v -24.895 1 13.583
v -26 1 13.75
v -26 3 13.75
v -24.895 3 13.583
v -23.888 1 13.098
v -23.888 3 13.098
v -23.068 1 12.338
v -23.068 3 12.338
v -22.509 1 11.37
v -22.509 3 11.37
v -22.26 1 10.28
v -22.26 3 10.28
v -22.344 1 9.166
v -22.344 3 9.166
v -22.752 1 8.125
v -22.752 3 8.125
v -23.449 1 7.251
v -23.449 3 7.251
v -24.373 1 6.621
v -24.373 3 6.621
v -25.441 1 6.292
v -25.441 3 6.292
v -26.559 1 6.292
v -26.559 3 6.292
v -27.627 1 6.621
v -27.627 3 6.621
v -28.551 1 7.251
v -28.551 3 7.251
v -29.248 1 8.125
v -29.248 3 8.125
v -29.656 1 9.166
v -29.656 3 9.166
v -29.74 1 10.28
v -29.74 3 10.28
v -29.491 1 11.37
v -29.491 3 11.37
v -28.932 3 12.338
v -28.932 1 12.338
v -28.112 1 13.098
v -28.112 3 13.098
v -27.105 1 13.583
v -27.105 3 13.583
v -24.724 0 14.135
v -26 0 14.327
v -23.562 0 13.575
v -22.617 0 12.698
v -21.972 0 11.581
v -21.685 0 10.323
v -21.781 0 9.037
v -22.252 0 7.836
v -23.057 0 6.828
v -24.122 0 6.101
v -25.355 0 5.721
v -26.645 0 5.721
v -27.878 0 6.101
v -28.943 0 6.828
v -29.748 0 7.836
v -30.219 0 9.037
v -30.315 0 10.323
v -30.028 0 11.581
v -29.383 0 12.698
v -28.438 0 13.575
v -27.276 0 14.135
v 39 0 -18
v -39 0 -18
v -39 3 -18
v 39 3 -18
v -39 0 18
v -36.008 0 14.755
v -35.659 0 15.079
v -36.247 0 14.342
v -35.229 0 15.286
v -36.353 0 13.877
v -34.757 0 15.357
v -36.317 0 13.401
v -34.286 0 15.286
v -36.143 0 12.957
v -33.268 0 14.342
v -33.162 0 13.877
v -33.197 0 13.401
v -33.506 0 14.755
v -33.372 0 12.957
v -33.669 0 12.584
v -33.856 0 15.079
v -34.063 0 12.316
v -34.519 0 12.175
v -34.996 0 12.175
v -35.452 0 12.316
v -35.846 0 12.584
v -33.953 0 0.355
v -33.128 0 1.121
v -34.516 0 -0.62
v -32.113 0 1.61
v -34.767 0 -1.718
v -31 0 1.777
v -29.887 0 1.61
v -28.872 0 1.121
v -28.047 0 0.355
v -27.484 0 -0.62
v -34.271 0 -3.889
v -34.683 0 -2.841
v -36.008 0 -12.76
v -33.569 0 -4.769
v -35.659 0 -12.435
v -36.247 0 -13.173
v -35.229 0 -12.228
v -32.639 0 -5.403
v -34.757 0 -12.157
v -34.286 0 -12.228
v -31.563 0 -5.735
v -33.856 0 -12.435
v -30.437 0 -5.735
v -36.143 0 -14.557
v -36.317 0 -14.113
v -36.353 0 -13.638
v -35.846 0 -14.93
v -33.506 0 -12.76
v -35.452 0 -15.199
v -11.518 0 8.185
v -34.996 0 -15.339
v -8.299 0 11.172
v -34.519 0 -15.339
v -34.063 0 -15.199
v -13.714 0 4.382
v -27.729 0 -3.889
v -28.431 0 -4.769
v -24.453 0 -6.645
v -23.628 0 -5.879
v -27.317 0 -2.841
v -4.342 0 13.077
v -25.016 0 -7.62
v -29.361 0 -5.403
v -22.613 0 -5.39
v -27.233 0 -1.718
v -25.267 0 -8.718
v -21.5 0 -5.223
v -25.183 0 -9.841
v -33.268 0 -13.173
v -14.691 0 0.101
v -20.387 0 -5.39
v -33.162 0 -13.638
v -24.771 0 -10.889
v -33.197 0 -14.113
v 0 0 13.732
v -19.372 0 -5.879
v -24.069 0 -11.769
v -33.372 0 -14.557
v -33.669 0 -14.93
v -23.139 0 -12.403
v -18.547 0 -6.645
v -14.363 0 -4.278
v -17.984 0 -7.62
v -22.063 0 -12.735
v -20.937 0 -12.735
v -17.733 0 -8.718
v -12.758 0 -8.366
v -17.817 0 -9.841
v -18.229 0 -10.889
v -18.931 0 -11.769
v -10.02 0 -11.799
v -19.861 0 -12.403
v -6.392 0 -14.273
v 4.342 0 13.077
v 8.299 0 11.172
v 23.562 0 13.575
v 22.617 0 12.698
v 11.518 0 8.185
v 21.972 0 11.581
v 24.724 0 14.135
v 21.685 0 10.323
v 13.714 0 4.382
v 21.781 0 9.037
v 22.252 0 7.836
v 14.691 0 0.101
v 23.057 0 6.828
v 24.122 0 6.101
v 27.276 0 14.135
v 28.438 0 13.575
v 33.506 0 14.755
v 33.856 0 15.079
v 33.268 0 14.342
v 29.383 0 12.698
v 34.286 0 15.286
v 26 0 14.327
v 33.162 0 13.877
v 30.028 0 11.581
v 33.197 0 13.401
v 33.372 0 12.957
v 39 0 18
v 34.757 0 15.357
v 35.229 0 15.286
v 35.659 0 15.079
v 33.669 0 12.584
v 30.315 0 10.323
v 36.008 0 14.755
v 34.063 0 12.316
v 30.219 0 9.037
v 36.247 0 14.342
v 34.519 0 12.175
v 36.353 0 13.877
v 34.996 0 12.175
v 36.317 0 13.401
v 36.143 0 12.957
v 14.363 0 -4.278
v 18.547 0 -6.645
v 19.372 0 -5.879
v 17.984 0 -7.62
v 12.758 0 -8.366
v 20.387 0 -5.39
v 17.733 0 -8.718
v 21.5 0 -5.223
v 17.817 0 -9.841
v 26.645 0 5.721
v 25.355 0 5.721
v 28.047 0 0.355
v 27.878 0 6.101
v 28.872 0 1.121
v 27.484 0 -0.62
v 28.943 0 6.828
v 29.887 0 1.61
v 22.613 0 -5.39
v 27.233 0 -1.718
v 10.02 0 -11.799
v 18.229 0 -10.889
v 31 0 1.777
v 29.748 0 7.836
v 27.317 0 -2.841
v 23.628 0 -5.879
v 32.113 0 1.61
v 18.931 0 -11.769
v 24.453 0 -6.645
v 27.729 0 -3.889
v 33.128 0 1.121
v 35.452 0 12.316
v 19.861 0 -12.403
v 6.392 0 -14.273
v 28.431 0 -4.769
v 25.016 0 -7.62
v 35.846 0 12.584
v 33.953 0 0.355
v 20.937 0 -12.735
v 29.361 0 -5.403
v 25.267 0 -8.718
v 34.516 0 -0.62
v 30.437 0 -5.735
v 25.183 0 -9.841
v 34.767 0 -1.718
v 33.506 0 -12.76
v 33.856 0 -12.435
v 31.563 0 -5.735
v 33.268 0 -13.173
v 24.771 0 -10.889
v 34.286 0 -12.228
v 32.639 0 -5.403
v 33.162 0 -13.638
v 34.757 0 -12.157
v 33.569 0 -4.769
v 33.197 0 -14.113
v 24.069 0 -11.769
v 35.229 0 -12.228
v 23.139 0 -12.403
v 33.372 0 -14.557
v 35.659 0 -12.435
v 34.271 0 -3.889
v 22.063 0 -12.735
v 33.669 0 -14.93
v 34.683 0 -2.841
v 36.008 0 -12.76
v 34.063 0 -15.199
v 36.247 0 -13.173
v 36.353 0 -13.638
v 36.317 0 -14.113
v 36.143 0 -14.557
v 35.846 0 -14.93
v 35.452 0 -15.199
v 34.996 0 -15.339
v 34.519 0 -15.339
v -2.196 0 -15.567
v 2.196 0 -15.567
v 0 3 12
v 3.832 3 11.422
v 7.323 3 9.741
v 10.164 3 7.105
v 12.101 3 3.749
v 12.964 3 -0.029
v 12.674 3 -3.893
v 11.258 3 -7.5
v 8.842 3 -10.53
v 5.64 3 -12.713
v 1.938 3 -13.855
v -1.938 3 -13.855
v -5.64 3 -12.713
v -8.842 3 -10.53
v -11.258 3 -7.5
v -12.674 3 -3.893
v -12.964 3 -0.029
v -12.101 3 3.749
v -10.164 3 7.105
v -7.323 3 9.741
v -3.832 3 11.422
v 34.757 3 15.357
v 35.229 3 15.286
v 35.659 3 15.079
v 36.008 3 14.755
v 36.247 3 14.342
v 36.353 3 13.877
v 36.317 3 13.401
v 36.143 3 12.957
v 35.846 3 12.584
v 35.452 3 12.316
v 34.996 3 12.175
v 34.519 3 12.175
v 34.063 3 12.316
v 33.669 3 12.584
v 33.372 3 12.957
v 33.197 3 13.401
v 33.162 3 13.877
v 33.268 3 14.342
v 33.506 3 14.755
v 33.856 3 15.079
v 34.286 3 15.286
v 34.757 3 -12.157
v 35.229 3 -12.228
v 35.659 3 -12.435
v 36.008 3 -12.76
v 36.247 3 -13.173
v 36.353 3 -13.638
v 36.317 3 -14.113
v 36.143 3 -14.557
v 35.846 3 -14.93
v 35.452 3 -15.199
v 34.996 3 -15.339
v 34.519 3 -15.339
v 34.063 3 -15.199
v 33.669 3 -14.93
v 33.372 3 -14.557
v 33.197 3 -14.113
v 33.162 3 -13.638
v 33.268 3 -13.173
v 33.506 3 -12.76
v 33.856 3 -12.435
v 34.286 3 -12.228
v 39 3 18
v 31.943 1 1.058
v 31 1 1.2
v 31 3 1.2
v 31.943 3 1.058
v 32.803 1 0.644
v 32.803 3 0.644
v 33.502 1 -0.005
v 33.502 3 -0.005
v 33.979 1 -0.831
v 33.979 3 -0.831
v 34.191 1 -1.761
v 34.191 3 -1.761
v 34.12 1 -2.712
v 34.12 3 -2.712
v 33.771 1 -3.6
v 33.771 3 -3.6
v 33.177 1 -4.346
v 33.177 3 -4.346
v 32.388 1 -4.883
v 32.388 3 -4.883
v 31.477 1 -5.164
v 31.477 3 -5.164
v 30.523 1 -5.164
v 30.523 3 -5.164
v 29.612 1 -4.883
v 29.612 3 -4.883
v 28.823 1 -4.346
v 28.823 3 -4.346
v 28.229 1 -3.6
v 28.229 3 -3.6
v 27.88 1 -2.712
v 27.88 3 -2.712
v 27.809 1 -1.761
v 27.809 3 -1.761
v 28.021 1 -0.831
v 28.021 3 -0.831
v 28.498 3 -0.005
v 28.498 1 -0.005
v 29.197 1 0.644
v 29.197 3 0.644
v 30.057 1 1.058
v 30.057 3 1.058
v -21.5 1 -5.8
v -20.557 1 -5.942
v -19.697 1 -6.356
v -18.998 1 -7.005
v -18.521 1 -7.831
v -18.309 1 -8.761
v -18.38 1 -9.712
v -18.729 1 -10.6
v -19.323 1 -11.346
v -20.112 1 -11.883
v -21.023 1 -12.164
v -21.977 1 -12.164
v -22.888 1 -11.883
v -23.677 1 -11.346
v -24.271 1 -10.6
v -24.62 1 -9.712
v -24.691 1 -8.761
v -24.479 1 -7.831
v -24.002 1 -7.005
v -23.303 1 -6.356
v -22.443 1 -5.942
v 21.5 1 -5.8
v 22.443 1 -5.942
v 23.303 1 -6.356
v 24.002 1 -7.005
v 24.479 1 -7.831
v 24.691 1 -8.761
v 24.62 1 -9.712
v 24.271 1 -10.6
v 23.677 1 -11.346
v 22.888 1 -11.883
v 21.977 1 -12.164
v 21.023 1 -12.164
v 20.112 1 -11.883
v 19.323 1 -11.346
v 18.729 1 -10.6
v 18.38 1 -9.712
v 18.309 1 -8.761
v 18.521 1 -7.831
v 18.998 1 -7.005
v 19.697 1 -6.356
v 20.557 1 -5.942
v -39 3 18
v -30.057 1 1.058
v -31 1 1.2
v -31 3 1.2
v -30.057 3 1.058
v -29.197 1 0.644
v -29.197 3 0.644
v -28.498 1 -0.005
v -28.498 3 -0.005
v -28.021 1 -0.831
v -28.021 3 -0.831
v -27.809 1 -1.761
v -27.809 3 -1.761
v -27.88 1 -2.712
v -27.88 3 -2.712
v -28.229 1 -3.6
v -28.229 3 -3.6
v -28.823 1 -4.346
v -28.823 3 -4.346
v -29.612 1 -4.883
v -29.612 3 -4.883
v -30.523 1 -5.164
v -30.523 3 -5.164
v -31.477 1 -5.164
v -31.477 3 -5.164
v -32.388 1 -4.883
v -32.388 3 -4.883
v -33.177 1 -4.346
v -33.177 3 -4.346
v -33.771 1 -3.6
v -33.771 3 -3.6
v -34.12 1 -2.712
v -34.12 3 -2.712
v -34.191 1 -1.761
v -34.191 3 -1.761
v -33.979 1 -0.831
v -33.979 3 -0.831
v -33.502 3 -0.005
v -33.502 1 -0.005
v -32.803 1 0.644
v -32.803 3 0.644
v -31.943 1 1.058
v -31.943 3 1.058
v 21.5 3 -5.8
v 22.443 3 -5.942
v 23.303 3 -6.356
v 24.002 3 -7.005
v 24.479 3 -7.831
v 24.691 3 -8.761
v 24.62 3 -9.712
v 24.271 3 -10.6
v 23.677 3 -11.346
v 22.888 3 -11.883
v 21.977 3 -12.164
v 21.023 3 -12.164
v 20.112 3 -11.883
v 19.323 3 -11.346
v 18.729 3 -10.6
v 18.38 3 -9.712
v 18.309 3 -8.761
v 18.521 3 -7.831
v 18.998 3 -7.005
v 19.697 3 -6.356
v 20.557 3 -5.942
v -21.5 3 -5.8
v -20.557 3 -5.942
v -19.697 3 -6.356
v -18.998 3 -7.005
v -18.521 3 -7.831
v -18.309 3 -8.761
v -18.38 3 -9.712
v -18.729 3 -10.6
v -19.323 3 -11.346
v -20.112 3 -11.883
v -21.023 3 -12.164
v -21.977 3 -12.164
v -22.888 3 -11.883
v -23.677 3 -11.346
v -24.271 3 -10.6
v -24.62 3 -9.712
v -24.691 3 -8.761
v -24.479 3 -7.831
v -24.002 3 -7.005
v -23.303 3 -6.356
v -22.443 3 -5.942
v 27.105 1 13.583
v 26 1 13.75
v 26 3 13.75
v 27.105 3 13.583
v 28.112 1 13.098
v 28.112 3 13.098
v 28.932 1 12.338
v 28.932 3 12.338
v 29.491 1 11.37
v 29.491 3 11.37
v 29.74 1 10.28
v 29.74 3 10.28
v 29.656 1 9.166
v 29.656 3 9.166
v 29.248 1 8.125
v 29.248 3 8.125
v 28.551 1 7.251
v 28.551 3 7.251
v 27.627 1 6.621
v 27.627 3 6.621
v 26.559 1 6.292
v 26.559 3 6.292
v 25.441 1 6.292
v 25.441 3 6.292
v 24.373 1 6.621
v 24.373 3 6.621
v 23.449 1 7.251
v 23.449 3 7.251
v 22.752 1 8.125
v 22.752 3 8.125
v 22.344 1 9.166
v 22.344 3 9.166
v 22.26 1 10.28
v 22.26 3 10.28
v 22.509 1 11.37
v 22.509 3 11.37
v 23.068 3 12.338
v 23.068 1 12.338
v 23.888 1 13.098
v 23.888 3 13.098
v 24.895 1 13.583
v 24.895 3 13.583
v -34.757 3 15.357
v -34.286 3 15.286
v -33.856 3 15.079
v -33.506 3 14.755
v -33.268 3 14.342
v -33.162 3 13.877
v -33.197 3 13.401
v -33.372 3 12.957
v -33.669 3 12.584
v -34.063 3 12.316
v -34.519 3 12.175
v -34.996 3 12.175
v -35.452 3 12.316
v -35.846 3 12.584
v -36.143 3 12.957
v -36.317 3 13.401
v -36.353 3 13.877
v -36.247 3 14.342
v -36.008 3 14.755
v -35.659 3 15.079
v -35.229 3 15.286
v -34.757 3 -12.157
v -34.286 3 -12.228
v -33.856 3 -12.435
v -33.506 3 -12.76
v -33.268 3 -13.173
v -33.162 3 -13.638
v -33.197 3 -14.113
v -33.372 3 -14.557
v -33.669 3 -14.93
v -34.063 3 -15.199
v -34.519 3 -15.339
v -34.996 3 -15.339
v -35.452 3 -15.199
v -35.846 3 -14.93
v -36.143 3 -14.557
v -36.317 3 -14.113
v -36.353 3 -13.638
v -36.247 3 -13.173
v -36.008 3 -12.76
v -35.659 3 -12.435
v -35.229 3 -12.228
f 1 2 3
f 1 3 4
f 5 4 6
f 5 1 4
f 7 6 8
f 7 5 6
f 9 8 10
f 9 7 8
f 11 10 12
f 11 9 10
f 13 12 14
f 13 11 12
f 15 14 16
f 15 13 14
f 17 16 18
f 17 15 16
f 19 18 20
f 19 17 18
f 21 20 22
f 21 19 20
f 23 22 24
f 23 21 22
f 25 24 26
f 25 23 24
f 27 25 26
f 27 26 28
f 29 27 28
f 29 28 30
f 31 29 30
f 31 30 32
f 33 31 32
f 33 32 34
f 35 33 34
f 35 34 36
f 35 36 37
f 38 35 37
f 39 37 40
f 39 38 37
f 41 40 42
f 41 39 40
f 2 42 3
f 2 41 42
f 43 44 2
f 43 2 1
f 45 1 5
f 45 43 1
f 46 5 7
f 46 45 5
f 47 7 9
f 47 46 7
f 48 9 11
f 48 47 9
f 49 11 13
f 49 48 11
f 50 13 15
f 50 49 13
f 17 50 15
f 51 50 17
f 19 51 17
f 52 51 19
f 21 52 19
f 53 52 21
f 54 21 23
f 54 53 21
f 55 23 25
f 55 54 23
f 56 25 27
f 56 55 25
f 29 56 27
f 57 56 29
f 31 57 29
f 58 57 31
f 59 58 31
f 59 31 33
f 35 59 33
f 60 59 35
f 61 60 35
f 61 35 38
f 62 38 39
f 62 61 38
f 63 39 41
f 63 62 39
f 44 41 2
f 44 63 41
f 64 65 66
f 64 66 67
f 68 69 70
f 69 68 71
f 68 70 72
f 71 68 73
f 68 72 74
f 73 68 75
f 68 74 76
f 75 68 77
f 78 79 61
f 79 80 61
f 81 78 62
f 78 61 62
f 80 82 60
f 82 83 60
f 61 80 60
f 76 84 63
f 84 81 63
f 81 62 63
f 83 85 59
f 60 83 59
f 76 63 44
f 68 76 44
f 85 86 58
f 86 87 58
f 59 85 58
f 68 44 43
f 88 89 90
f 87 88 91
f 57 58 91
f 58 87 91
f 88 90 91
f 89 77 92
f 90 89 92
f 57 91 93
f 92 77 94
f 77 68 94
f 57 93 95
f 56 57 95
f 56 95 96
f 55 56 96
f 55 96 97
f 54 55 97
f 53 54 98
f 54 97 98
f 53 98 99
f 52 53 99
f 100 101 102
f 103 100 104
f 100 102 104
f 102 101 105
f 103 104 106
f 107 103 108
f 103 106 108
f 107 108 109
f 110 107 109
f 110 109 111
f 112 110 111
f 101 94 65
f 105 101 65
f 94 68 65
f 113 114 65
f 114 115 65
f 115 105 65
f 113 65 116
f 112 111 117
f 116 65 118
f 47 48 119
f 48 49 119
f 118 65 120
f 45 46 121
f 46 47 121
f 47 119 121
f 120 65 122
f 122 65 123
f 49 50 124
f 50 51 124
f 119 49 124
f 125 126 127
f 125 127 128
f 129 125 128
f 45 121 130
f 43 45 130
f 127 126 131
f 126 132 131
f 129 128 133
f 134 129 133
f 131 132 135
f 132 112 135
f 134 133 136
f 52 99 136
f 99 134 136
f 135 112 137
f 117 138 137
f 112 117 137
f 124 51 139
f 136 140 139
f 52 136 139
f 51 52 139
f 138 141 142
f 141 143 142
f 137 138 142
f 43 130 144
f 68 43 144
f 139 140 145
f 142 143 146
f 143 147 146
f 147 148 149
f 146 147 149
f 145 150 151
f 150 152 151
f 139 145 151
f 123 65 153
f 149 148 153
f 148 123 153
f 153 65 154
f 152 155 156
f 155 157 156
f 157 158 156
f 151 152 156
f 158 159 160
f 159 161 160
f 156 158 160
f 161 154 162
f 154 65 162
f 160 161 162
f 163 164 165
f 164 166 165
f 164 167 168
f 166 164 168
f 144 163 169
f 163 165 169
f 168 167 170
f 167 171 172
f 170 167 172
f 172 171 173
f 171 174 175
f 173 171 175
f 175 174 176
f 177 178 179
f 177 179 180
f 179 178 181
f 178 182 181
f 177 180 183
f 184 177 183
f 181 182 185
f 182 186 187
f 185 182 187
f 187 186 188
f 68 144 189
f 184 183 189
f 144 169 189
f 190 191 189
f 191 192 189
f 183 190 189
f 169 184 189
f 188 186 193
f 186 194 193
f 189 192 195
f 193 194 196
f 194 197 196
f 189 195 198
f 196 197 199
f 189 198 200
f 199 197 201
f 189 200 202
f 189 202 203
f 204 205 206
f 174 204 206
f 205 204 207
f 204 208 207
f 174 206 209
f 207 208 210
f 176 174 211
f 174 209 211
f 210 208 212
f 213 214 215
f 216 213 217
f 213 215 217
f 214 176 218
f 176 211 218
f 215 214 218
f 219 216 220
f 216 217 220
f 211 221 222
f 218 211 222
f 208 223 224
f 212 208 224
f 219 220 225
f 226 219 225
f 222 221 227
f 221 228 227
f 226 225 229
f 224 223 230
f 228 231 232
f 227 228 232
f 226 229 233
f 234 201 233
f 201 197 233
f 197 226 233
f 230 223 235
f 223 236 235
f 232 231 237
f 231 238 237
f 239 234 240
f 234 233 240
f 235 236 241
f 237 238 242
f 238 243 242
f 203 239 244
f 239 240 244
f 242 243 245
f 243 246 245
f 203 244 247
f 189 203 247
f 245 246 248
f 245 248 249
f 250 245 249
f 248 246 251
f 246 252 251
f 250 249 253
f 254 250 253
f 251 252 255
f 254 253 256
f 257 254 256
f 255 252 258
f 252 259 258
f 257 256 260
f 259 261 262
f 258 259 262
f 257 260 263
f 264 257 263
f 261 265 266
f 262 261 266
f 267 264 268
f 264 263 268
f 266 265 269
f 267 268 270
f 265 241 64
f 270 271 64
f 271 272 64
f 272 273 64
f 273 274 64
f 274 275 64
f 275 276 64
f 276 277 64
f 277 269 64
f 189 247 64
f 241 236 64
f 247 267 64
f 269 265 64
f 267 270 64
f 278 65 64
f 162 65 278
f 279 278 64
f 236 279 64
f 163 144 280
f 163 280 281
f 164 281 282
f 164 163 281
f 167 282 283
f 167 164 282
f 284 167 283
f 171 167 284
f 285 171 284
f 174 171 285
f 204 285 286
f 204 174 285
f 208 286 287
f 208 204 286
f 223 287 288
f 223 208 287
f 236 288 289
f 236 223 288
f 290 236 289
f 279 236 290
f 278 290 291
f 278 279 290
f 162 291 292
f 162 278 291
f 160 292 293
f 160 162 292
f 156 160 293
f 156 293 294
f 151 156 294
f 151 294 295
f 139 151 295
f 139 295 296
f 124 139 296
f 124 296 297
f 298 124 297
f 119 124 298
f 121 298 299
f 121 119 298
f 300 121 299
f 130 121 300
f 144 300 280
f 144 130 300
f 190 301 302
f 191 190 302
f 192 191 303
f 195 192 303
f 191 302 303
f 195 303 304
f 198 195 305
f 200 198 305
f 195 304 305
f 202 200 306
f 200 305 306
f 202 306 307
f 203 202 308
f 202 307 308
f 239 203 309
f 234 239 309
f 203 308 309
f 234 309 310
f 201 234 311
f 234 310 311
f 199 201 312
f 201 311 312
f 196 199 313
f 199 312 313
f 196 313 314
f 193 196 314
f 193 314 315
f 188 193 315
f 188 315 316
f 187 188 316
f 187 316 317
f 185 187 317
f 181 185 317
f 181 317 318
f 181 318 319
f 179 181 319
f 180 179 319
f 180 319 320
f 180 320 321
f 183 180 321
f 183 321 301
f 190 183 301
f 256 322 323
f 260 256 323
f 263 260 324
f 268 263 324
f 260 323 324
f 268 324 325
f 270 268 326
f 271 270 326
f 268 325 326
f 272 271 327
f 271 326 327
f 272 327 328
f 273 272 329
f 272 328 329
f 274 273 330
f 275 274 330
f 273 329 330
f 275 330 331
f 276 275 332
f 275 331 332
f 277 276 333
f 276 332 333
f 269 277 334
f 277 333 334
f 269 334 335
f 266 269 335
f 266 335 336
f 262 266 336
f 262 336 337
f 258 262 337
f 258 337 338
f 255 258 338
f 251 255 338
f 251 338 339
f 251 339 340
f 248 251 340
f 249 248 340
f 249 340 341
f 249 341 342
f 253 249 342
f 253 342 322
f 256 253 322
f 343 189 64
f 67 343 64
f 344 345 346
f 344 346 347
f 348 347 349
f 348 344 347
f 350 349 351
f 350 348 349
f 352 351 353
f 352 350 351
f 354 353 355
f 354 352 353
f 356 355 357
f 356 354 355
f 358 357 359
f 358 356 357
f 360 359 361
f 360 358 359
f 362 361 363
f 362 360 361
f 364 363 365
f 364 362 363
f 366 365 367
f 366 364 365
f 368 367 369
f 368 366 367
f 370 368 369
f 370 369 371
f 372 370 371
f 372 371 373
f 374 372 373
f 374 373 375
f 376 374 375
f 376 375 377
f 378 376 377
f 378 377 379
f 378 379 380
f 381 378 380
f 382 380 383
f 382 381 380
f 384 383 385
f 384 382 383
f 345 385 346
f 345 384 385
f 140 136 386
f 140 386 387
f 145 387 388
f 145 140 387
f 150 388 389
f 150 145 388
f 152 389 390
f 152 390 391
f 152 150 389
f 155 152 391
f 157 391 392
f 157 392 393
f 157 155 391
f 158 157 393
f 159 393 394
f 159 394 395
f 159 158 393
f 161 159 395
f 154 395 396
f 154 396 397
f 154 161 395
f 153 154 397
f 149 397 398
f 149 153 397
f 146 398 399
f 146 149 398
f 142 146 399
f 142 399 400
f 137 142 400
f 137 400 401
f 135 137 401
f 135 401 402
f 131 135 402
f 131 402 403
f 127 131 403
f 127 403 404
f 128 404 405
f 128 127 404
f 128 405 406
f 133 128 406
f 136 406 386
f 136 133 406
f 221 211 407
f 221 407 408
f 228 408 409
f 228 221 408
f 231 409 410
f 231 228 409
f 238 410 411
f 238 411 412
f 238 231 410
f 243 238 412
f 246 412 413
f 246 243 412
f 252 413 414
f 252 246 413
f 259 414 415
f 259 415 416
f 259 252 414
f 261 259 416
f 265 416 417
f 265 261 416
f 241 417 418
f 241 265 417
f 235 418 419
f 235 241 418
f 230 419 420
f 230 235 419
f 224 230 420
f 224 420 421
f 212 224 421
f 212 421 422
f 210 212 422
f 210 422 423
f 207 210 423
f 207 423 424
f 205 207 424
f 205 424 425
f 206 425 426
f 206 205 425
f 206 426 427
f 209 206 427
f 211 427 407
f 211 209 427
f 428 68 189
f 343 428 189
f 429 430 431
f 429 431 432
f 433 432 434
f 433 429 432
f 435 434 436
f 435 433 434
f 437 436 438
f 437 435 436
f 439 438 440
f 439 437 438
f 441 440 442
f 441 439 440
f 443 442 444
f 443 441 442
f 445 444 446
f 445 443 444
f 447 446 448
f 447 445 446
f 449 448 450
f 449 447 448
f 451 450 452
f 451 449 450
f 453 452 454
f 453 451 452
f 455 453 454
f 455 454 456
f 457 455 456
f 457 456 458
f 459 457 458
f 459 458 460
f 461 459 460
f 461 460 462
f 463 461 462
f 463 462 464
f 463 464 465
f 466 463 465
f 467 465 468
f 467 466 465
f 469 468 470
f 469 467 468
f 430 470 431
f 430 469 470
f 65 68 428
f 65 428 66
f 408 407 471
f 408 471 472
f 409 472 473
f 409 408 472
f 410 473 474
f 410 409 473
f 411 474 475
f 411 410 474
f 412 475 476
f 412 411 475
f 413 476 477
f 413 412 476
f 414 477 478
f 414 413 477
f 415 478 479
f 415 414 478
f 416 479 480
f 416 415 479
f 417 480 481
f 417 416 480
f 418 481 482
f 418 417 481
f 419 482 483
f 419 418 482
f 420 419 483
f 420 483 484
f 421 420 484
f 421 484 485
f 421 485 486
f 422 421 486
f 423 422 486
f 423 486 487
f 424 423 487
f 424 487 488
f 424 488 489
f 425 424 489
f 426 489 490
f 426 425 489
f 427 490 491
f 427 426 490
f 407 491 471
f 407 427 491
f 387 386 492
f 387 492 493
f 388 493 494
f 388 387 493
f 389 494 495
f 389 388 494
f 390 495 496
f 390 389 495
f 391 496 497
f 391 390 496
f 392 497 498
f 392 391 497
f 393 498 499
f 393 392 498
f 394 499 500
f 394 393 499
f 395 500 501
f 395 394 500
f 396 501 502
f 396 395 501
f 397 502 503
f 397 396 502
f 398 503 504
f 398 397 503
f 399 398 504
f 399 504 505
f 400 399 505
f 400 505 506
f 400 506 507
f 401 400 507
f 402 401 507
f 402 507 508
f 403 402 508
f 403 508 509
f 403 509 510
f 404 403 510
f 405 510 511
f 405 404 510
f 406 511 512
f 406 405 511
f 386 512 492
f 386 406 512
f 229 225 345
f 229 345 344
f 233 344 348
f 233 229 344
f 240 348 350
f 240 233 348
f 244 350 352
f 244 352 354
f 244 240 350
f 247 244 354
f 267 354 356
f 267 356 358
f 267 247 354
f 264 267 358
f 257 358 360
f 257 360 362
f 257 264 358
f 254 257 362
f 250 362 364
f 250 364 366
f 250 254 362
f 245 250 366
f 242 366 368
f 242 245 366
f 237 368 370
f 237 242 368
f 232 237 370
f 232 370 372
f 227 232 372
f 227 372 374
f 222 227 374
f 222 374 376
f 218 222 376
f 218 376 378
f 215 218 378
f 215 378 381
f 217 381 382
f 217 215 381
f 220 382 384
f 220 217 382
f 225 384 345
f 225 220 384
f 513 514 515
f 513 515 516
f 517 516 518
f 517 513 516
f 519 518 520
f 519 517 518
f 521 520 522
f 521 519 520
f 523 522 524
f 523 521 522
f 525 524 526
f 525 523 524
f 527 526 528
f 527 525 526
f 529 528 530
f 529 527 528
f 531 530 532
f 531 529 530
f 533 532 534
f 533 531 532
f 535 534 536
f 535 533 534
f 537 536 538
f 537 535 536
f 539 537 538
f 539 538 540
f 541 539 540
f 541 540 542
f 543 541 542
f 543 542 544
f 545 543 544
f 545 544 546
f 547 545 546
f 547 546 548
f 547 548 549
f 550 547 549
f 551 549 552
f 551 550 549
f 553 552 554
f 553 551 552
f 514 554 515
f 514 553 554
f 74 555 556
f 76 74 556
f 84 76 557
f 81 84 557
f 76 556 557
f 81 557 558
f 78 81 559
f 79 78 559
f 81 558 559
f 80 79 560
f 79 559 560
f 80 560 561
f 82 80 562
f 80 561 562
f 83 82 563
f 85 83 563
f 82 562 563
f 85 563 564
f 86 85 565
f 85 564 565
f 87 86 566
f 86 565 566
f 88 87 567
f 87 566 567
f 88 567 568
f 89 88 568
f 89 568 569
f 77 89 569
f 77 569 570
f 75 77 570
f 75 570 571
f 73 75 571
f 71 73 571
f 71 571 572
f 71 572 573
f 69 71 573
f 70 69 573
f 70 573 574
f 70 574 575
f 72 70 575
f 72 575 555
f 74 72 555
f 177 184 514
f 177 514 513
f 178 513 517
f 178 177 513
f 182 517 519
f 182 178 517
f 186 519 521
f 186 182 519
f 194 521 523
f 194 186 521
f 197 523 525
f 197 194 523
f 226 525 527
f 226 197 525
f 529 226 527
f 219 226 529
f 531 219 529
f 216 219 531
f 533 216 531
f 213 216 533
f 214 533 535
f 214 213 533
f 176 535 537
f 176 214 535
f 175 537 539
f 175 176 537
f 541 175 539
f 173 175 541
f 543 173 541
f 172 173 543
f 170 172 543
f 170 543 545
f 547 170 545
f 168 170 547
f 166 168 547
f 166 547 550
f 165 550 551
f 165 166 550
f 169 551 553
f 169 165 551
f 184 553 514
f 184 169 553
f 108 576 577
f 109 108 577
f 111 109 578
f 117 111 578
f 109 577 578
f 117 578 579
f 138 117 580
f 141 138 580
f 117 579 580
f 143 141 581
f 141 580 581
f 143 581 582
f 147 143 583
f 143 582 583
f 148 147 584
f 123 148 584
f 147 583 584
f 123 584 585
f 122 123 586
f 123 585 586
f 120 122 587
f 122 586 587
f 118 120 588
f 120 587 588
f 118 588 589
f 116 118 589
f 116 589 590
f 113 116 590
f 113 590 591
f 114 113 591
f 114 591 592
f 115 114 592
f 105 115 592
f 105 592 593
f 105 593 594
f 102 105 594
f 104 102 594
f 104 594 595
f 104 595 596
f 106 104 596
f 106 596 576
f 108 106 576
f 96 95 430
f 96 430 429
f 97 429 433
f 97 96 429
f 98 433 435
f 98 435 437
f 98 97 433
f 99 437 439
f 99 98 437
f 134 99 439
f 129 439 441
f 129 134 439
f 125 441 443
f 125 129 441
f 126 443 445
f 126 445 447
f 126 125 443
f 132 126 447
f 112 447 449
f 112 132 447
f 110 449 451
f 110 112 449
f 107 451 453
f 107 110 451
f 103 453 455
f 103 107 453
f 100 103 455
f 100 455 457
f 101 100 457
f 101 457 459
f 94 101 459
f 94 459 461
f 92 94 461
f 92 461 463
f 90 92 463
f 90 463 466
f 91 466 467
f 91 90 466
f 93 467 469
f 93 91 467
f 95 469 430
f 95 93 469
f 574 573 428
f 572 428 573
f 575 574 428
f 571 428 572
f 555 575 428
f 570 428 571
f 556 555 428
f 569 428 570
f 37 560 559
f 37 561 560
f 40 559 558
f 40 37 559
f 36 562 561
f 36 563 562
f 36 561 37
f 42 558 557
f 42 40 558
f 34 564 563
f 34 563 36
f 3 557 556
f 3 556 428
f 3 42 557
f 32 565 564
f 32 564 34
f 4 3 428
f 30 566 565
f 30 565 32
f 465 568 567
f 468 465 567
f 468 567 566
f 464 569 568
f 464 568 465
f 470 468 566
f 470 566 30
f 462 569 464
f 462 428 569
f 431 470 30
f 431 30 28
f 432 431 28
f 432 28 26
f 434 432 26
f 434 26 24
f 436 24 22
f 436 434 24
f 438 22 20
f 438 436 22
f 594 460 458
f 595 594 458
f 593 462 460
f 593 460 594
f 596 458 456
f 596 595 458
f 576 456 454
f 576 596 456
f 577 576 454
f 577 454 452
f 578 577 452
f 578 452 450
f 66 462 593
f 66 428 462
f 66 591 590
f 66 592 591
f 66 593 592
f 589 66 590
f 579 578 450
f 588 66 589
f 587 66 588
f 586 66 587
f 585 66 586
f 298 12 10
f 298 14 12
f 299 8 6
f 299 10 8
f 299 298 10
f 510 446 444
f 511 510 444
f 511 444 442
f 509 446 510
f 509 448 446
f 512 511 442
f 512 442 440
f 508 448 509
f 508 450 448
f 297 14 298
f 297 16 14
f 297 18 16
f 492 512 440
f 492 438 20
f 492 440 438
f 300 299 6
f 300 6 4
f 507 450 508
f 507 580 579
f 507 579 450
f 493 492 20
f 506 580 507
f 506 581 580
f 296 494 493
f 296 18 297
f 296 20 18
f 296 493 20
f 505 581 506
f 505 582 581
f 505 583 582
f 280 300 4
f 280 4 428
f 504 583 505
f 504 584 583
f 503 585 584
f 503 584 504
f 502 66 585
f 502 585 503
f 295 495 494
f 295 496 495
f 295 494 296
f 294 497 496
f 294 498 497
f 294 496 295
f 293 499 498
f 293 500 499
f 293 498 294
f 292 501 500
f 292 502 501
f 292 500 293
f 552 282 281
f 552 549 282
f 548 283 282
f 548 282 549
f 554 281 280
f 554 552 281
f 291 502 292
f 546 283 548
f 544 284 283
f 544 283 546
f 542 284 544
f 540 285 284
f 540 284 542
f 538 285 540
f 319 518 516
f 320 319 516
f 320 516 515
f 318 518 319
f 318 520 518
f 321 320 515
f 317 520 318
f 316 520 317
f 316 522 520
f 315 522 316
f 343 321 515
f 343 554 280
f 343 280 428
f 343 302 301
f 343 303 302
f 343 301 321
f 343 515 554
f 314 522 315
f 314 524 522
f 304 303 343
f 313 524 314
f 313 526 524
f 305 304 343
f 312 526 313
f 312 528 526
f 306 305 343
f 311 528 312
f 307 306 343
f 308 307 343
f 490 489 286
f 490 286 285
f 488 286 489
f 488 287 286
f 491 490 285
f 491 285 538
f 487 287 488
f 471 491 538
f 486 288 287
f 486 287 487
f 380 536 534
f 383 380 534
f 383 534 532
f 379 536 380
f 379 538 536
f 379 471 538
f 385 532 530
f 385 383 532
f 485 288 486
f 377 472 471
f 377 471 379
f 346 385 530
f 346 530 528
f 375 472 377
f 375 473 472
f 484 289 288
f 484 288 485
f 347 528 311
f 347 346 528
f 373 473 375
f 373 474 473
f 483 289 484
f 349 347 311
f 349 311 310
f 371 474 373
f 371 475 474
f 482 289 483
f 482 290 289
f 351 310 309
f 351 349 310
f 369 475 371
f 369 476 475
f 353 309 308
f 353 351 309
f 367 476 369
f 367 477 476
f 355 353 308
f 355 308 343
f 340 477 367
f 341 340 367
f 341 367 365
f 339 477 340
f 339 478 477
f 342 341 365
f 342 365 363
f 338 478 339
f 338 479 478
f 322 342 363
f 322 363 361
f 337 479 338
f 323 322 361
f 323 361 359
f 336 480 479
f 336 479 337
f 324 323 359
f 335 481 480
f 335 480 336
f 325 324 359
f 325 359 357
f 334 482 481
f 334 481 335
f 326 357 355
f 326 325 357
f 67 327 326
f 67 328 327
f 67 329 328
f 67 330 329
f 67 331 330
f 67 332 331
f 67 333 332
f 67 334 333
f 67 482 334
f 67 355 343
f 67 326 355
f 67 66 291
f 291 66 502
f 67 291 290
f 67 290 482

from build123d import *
from OCP.BRepFilletAPI import BRepFilletAPI_MakeChamfer

# Parameters (mm, degrees)
SKETCH1_W           = 78
SKETCH1_H           = 36
SKETCH1_R           = 13
SKETCH1_R_2         = 3.2
SKETCH1_R_3         = 3.75
BOSS_EXTRUDE1_DEPTH = 3
CHAMFER1_SIZE2      = 1.732050808
CHAMFER1_SIZE       = 3
CHAMFER2_SIZE       = 1
CHAMFER2_SIZE2      = 0.577350269
SKETCH2_R           = 1.6
CUT_EXTRUDE1_DEPTH  = 44.058100283


with BuildPart() as part:
    # Sketch1 → Boss-Extrude1 (new body)
    with BuildSketch(Plane(origin=(0, 0, 0), x_dir=(1, 0, 0), z_dir=(0, 1, 0))):
        Rectangle(SKETCH1_W, SKETCH1_H)
        with Locations(Location((0, 1, 0), (0, 0, 270))):
            Circle(SKETCH1_R, mode=Mode.SUBTRACT)
        with Locations(Location((-31, 2, 0), (0, 0, 270))):
            Circle(SKETCH1_R_2, mode=Mode.SUBTRACT)
        with Locations(Location((-26, -10, 0), (0, 0, 270))):
            Circle(SKETCH1_R_3, mode=Mode.SUBTRACT)
        with Locations(Location((31, 2, 0), (0, 0, 270))):
            Circle(SKETCH1_R_2, mode=Mode.SUBTRACT)
        with Locations(Location((26, -10, 0), (0, 0, 270))):
            Circle(SKETCH1_R_3, mode=Mode.SUBTRACT)
        with Locations(Location((21.5, 9, 0), (0, 0, 270))):
            Circle(SKETCH1_R_2, mode=Mode.SUBTRACT)
        with Locations(Location((-21.5, 9, 0), (0, 0, 270))):
            Circle(SKETCH1_R_2, mode=Mode.SUBTRACT)
    extrude(amount=BOSS_EXTRUDE1_DEPTH)

    # Chamfer1
    chamfer1_edges = [part.edges().sort_by_distance(p)[0] for p in [
        (0, 0, -14),
    ]]
    chamfer1_side = [part.faces().sort_by_distance(p)[0] for p in [
        (0, 0.034641016, -14),
    ]]
    chamfer(chamfer1_edges, length=CHAMFER1_SIZE - 0.0001, length2=CHAMFER1_SIZE2 - 0.0001, reference=chamfer1_side[0])  # a hair under: the kernel refuses the full size

    # Chamfer2: one chamfer whose edges measure the first distance from different faces: ONE call of the kernel's chamfer builder (chamfer() names one face for all edges)
    chamfer2_edges_1 = [part.edges().sort_by_distance(p)[0] for p in [
        (-31, 0, -5.2),
    ]]
    chamfer2_side_1 = [part.faces().sort_by_distance(p)[0] for p in [
        (-31, 1.5, -5.2),
    ]]
    chamfer2_edges_2 = [part.edges().sort_by_distance(p)[0] for p in [
        (-26, 0, 6.25),
    ]]
    chamfer2_side_2 = [part.faces().sort_by_distance(p)[0] for p in [
        (-26, 1.5, 6.25),
    ]]
    chamfer2_edges_3 = [part.edges().sort_by_distance(p)[0] for p in [
        (31, 0, -5.2),
    ]]
    chamfer2_side_3 = [part.faces().sort_by_distance(p)[0] for p in [
        (31, 1.5, -5.2),
    ]]
    chamfer2_edges_4 = [part.edges().sort_by_distance(p)[0] for p in [
        (26, 0, 6.25),
    ]]
    chamfer2_side_4 = [part.faces().sort_by_distance(p)[0] for p in [
        (26, 1.5, 6.25),
    ]]
    chamfer2_edges_5 = [part.edges().sort_by_distance(p)[0] for p in [
        (21.5, 0, -12.2),
    ]]
    chamfer2_side_5 = [part.faces().sort_by_distance(p)[0] for p in [
        (21.5, 1.5, -12.2),
    ]]
    chamfer2_edges_6 = [part.edges().sort_by_distance(p)[0] for p in [
        (-21.5, 0, -12.2),
    ]]
    chamfer2_side_6 = [part.faces().sort_by_distance(p)[0] for p in [
        (-21.5, 1.5, -12.2),
    ]]
    chamfer2 = BRepFilletAPI_MakeChamfer(part.part.solid().wrapped)
    for e in chamfer2_edges_1:
        chamfer2.Add(CHAMFER2_SIZE, CHAMFER2_SIZE2, e.wrapped, chamfer2_side_1[0].wrapped)  # the first distance lies on this face
    for e in chamfer2_edges_2:
        chamfer2.Add(CHAMFER2_SIZE, CHAMFER2_SIZE2, e.wrapped, chamfer2_side_2[0].wrapped)  # the first distance lies on this face
    for e in chamfer2_edges_3:
        chamfer2.Add(CHAMFER2_SIZE, CHAMFER2_SIZE2, e.wrapped, chamfer2_side_3[0].wrapped)  # the first distance lies on this face
    for e in chamfer2_edges_4:
        chamfer2.Add(CHAMFER2_SIZE, CHAMFER2_SIZE2, e.wrapped, chamfer2_side_4[0].wrapped)  # the first distance lies on this face
    for e in chamfer2_edges_5:
        chamfer2.Add(CHAMFER2_SIZE, CHAMFER2_SIZE2, e.wrapped, chamfer2_side_5[0].wrapped)  # the first distance lies on this face
    for e in chamfer2_edges_6:
        chamfer2.Add(CHAMFER2_SIZE, CHAMFER2_SIZE2, e.wrapped, chamfer2_side_6[0].wrapped)  # the first distance lies on this face
    add(Compound.cast(chamfer2.Shape()), mode=Mode.REPLACE)

    # Sketch2 → Cut-Extrude1 (cut, through all)
    with BuildSketch(Plane(origin=(0, 3, 0), x_dir=(1, 0, 0), z_dir=(0, 1, 0))):
        with Locations(Location((-34.757359313, -13.757359313, 0), (0, 0, 270))):
            Circle(SKETCH2_R)
        with Locations(Location((-34.757359313, 13.757359313, 0), (0, 0, 270))):
            Circle(SKETCH2_R)
        with Locations(Location((34.757359313, 13.757359313, 0), (0, 0, 270))):
            Circle(SKETCH2_R)
        with Locations(Location((34.757359313, -13.757359313, 0), (0, 0, 270))):
            Circle(SKETCH2_R)
    extrude(amount=-CUT_EXTRUDE1_DEPTH, mode=Mode.SUBTRACT)


solid = part.part
